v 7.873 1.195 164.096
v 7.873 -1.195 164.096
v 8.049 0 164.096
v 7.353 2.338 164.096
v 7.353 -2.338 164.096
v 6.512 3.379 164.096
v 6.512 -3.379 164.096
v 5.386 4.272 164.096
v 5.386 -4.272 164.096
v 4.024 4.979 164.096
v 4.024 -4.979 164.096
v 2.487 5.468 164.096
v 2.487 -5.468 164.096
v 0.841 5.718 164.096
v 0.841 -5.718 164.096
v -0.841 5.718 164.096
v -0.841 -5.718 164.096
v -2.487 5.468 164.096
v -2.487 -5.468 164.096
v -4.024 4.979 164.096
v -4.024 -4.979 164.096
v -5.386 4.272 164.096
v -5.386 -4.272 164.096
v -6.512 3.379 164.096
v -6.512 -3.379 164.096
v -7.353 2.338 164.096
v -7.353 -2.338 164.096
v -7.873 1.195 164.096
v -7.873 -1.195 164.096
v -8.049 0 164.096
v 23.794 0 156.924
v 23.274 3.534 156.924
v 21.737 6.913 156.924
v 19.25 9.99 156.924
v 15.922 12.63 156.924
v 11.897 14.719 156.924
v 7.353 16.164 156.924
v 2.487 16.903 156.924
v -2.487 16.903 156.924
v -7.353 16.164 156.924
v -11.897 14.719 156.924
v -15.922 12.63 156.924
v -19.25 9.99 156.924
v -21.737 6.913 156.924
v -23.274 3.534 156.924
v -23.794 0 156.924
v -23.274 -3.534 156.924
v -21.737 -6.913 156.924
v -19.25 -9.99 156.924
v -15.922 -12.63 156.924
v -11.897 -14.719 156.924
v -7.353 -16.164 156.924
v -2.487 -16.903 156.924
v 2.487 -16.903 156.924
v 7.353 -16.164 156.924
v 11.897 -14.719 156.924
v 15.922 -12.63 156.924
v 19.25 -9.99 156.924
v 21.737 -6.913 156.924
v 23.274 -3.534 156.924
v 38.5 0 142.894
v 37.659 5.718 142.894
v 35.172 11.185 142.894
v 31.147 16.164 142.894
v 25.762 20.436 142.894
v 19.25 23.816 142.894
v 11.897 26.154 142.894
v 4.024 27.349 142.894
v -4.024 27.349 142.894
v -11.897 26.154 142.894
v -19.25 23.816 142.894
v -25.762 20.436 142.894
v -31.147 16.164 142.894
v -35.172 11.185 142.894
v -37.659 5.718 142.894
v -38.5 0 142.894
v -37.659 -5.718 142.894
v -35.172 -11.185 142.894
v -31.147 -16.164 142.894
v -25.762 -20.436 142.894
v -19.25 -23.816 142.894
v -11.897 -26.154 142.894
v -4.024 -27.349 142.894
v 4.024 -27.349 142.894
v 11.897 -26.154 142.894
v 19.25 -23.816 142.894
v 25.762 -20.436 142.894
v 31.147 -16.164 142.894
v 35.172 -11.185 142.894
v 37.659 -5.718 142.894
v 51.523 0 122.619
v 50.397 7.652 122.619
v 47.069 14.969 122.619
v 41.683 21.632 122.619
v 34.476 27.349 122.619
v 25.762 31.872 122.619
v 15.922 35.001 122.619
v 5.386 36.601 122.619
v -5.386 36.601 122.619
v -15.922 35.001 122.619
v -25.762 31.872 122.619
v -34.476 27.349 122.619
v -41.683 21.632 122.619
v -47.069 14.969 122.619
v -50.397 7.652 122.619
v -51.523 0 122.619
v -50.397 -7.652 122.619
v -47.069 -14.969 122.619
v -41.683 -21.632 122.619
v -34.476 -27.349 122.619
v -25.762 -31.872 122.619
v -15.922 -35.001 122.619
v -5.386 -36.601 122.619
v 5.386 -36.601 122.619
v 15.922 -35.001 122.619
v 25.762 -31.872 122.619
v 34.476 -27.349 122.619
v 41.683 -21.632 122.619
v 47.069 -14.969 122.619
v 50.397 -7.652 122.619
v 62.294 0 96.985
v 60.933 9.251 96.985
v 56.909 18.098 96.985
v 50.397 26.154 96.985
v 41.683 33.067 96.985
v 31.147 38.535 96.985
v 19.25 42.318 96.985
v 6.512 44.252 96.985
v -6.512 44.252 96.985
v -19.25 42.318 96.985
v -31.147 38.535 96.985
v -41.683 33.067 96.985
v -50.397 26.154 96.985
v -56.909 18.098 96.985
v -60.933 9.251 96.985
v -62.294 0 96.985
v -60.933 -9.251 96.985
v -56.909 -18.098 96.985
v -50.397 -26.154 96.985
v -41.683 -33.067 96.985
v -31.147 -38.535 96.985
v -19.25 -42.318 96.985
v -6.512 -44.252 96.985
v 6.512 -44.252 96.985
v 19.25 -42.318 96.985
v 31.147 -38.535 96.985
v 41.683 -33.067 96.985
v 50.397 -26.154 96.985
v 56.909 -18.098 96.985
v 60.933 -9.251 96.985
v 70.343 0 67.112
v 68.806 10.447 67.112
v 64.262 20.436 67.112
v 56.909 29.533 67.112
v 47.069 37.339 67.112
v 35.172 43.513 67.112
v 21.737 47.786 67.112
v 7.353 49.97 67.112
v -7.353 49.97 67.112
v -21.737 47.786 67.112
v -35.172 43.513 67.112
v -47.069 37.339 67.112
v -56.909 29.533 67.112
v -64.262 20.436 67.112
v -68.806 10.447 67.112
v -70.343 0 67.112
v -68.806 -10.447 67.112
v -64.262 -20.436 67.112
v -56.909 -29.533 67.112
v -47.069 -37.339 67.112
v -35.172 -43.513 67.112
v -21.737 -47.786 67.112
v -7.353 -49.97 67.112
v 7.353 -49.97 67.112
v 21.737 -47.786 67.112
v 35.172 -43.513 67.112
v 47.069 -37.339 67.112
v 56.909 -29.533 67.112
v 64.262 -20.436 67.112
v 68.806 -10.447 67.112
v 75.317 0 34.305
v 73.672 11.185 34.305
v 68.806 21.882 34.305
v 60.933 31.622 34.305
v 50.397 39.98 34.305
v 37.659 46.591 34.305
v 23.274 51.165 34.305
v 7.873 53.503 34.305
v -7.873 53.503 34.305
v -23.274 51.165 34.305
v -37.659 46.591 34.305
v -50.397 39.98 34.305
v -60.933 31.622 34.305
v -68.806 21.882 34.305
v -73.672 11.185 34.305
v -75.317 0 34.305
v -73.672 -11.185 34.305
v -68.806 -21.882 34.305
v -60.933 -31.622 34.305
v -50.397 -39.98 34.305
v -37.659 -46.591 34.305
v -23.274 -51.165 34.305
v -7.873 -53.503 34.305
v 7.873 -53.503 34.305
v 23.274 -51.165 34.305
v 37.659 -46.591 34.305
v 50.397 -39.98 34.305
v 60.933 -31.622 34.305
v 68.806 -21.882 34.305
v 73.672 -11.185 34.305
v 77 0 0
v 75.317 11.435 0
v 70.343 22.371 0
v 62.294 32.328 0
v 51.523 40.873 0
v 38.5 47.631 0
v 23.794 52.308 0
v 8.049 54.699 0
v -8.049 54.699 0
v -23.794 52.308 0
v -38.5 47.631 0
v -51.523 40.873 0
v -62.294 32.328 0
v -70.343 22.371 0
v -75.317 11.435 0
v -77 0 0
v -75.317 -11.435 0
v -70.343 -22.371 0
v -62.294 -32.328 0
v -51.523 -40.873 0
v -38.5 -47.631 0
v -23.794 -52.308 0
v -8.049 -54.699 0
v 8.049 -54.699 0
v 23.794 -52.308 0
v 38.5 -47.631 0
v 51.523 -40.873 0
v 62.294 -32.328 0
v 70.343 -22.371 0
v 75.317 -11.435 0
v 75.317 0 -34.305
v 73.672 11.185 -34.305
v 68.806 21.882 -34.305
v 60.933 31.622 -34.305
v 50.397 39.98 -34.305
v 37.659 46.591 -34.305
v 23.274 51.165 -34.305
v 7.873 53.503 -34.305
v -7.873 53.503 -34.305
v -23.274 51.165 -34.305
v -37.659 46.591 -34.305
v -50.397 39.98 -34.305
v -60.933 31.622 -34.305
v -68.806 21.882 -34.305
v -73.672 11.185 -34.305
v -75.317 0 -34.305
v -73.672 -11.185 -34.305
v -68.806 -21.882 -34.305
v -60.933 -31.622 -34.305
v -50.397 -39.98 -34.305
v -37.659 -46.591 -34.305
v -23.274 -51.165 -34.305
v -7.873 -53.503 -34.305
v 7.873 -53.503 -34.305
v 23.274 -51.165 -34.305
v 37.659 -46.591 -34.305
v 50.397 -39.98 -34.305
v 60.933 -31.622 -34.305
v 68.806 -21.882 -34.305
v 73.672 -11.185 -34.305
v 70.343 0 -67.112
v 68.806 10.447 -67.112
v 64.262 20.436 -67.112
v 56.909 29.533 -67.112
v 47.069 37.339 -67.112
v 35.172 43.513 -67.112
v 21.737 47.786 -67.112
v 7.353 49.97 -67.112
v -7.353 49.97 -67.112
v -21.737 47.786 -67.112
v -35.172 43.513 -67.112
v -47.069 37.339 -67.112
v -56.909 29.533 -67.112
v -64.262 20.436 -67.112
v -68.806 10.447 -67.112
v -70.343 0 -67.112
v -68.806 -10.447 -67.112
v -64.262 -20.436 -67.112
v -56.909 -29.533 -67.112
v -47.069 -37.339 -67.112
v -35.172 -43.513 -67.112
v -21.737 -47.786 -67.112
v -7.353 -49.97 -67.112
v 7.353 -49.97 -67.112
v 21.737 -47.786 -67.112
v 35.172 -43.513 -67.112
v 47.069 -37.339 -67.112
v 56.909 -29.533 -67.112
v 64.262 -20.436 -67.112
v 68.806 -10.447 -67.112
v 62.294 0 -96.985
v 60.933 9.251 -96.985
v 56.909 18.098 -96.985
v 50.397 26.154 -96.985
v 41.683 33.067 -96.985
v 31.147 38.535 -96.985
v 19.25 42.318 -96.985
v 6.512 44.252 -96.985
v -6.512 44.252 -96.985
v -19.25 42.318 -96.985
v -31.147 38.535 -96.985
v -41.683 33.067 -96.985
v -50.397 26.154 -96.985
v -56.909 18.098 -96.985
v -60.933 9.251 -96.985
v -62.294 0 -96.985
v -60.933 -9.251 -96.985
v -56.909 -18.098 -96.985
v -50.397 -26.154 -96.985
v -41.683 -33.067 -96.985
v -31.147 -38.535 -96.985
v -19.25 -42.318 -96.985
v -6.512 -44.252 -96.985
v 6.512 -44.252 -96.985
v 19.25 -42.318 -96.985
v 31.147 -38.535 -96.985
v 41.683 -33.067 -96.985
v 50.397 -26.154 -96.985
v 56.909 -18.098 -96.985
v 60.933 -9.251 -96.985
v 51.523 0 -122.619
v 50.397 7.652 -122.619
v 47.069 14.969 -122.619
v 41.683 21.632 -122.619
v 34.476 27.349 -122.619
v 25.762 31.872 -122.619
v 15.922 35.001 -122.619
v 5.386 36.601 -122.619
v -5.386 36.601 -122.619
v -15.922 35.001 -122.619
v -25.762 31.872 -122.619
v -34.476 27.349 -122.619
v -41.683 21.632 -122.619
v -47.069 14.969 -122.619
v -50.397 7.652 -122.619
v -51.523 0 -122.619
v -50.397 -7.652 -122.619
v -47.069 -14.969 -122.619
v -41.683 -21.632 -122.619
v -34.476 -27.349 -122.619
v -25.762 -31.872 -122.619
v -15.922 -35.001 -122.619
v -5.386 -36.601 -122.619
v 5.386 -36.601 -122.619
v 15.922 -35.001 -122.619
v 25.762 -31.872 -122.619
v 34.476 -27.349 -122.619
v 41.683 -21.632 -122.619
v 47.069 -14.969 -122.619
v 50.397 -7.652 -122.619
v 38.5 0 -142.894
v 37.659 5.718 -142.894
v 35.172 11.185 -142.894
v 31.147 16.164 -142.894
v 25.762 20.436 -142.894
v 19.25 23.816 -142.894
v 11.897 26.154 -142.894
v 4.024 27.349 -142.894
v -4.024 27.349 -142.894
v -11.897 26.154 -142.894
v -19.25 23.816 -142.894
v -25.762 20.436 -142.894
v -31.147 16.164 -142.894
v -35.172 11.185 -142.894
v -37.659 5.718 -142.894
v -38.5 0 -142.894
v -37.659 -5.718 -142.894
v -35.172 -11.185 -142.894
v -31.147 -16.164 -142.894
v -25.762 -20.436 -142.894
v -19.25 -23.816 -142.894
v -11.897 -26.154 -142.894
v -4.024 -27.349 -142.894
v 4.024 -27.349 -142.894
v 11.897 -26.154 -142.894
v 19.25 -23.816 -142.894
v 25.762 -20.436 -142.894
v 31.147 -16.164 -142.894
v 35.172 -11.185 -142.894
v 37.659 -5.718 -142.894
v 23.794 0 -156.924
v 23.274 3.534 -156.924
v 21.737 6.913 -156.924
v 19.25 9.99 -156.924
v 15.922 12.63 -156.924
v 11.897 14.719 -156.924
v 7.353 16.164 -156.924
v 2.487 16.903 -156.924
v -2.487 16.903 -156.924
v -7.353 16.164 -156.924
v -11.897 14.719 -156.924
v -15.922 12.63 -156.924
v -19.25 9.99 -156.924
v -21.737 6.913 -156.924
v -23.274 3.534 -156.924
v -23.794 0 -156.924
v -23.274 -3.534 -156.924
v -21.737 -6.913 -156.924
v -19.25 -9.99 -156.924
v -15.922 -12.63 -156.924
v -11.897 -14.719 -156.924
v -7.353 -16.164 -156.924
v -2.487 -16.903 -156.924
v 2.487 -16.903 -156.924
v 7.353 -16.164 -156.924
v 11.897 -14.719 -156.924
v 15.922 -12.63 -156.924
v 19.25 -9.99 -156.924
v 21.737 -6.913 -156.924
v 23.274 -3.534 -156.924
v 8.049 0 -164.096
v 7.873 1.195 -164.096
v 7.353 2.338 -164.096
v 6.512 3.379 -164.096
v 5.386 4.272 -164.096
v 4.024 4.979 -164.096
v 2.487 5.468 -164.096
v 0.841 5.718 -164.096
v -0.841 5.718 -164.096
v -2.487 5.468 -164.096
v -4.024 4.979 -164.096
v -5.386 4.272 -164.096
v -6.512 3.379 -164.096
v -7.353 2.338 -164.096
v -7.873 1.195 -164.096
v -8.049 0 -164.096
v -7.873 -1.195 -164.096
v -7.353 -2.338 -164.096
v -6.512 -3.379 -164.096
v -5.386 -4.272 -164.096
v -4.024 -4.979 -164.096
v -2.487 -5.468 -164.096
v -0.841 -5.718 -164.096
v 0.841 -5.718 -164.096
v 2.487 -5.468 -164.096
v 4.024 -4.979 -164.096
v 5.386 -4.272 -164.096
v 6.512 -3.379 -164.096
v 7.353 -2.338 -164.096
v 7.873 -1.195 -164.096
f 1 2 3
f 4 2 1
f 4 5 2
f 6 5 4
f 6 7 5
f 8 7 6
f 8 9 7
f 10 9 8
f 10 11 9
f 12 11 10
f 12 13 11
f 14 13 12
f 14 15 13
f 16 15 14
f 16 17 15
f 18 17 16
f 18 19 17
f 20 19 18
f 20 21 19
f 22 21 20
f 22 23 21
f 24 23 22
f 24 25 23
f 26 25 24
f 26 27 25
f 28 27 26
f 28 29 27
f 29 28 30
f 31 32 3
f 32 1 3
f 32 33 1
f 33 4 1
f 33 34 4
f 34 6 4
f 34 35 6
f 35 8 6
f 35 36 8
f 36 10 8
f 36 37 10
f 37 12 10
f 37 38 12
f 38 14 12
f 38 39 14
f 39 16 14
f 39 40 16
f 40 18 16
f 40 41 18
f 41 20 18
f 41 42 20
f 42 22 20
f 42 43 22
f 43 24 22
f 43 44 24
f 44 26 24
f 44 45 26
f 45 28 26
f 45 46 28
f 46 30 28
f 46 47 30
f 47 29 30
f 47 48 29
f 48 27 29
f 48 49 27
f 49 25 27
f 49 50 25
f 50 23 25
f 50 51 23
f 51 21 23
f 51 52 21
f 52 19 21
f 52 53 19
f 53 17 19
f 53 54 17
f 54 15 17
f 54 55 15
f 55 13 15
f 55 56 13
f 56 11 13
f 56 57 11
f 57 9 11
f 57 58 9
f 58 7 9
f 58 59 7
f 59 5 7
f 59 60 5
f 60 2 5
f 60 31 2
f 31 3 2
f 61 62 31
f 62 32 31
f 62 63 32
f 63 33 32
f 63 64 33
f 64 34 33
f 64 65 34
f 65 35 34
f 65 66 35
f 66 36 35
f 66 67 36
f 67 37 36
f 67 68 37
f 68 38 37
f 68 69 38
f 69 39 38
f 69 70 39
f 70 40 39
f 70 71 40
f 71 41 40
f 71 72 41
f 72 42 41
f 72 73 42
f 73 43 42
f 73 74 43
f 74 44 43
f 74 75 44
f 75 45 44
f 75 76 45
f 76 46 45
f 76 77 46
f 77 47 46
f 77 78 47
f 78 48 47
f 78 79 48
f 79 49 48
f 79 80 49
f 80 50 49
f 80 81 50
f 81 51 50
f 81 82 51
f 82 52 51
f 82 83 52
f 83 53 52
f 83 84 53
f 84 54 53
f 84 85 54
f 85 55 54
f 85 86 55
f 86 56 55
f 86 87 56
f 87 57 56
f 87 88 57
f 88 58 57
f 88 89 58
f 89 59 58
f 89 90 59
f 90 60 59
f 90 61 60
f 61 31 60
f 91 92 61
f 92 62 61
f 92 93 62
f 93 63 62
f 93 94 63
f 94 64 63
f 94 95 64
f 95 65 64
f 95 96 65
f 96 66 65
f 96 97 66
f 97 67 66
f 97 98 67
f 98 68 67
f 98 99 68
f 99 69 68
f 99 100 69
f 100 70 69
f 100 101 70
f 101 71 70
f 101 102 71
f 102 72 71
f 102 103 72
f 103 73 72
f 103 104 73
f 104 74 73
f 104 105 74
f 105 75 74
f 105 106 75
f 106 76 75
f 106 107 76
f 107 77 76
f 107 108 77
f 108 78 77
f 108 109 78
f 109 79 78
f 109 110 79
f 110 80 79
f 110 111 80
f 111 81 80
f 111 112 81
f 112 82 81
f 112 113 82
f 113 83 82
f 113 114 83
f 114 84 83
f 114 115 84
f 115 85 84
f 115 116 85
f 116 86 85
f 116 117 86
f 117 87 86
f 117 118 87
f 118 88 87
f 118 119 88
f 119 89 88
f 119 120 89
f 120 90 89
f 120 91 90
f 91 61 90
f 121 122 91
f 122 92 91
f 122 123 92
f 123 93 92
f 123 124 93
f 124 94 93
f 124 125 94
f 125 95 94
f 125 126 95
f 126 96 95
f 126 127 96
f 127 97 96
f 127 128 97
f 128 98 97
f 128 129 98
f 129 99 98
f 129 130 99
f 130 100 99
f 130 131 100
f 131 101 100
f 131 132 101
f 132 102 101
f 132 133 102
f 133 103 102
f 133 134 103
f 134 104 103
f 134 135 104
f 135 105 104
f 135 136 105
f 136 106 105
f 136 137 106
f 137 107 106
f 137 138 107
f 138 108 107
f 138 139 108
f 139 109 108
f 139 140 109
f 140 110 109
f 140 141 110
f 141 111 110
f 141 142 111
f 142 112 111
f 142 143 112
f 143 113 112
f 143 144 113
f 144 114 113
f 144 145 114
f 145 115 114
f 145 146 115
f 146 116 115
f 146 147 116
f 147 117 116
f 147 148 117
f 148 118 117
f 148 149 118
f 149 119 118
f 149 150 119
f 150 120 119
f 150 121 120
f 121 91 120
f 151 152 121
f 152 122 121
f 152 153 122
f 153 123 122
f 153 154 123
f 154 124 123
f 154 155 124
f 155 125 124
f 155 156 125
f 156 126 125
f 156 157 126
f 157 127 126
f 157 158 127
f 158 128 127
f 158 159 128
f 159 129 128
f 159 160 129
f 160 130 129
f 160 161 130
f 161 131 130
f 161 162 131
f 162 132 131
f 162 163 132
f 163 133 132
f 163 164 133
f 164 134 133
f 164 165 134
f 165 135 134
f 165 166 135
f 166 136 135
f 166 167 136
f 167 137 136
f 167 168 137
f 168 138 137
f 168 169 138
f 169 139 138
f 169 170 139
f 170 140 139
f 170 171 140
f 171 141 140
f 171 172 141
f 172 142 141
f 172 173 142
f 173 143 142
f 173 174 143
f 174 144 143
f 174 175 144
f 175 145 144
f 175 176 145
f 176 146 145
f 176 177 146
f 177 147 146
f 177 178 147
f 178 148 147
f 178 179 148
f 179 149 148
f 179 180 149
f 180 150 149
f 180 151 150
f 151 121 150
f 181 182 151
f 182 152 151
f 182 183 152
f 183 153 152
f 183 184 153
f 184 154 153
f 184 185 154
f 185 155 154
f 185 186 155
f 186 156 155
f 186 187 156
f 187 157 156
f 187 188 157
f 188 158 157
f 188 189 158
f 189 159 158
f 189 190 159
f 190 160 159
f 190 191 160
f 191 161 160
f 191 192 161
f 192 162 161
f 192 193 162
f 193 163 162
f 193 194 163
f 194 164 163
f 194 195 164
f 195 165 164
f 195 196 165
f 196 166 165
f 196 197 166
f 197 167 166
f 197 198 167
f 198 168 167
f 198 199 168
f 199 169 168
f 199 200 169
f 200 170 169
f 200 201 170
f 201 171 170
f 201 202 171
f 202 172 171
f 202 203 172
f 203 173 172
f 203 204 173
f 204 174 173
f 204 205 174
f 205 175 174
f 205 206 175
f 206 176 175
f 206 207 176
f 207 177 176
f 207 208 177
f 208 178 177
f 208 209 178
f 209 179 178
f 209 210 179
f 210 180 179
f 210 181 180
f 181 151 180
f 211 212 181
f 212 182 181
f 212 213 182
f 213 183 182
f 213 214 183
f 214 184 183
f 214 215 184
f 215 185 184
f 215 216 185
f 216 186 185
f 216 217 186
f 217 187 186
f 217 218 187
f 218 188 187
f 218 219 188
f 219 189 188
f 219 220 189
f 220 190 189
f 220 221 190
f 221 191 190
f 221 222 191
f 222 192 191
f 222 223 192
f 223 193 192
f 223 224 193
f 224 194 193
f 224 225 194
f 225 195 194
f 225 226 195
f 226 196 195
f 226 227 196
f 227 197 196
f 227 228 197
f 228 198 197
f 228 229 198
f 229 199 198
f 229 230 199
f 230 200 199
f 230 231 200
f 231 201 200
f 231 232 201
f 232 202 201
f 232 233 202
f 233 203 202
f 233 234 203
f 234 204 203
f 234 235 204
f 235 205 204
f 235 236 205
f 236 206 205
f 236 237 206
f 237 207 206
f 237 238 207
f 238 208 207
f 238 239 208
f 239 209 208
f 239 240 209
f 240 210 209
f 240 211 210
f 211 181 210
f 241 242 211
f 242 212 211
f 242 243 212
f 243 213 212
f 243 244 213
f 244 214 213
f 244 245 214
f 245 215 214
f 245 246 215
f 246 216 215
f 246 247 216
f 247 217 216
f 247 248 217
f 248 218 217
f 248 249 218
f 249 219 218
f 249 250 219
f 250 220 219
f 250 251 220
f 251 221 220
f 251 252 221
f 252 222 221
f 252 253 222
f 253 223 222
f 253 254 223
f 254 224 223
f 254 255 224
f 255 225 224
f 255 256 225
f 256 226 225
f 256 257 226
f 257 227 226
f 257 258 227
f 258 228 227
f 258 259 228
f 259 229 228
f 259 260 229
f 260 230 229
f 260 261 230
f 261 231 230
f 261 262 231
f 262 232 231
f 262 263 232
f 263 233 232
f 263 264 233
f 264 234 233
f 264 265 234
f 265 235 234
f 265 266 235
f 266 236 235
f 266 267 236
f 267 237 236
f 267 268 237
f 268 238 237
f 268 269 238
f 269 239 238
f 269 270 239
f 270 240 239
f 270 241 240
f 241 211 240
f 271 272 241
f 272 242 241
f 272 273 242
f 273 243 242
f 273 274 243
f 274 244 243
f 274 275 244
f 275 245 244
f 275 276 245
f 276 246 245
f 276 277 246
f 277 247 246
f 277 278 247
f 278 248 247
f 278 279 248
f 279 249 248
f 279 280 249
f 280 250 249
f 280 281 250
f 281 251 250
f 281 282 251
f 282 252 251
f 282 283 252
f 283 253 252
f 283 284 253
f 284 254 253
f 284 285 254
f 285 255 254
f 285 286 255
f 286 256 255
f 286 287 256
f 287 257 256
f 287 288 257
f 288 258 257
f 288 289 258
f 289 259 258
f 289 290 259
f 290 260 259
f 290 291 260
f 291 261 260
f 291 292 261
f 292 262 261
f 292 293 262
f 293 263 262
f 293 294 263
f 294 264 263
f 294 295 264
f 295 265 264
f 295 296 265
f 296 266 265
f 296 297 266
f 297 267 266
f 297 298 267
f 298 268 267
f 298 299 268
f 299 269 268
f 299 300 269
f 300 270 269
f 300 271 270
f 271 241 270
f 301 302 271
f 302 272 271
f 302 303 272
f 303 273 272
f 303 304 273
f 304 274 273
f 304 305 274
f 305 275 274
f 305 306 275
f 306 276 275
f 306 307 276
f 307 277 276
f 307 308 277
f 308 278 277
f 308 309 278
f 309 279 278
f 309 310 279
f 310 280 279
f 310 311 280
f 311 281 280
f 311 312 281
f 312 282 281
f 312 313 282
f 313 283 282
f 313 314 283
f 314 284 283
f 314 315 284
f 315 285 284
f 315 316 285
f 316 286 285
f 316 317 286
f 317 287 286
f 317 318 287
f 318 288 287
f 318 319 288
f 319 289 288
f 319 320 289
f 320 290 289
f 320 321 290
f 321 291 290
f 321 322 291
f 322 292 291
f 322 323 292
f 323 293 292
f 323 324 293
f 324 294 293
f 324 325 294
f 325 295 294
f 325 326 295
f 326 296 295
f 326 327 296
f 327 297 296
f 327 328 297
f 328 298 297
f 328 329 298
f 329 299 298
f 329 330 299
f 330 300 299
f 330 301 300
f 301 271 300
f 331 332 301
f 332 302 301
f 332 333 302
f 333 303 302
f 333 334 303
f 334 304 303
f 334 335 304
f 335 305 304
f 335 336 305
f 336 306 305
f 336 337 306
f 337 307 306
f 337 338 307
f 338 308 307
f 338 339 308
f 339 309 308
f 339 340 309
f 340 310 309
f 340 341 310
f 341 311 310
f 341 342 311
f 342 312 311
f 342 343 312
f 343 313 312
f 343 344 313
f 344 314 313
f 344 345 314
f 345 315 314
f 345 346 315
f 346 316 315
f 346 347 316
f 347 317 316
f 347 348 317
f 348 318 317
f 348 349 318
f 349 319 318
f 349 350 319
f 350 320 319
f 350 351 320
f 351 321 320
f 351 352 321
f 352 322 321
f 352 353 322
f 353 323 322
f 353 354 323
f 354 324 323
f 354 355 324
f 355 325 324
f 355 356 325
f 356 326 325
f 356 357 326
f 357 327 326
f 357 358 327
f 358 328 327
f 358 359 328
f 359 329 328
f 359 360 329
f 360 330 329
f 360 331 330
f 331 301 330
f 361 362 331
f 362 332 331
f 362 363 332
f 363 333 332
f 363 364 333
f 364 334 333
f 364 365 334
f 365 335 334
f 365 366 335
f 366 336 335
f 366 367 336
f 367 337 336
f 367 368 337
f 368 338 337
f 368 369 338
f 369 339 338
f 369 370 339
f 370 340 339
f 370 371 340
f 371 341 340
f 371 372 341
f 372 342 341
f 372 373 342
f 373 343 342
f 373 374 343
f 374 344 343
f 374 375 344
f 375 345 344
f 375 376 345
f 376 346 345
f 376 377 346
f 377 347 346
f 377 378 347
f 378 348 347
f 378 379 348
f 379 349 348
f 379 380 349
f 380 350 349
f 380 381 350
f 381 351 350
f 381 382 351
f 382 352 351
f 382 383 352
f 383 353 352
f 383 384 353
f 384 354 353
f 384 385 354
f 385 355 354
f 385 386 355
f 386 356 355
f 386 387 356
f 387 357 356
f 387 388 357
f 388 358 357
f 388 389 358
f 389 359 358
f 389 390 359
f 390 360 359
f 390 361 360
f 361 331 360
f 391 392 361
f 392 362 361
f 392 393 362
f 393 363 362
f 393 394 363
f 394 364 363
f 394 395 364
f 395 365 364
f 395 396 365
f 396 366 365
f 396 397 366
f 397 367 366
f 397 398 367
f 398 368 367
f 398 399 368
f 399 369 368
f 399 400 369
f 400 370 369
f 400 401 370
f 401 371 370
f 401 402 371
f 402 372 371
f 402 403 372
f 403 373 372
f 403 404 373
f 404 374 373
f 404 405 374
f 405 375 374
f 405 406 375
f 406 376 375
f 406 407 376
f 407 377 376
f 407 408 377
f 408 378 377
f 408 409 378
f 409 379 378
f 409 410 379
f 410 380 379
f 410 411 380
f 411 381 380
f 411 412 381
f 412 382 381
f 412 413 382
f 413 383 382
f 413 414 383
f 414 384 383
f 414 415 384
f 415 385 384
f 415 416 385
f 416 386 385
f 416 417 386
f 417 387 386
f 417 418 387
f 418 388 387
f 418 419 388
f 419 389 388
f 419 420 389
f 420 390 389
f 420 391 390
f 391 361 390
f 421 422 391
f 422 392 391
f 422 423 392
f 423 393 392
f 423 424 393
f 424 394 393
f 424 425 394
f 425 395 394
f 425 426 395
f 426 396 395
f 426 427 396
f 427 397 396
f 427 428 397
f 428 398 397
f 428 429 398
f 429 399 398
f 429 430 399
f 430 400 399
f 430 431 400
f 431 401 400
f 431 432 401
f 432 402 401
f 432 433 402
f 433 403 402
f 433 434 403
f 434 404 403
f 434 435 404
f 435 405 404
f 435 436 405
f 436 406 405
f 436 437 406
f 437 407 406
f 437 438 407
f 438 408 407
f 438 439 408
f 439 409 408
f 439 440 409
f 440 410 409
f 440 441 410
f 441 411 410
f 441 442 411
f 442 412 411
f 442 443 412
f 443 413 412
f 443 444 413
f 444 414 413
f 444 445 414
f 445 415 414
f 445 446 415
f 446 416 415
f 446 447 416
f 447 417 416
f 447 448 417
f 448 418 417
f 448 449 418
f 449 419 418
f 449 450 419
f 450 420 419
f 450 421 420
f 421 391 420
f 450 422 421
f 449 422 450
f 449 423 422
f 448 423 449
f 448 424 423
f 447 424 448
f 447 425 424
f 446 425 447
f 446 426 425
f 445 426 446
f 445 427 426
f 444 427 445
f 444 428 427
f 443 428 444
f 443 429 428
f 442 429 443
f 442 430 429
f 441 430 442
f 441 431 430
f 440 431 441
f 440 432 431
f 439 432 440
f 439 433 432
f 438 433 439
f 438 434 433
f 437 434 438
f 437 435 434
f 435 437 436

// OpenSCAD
// Generated by SolidPython 1.0.1 on 2020-07-29 00:46:47


scale(v = [7, 5, 15]) {
	sphere(r = 11);
}
/***********************************************
*********      SolidPython code:      **********
************************************************
 
# import packages: SolidPython
from solid import *
from solid.utils import *
from itertools import chain, combinations, permutations


class Resize:

    def __init__(self, scad_file):
        self.scad_file = scad_file
        #self.scad_file = import_scad(scad_file)
        # cone/cylinder param:
        self.r1 = 0
        self.r2 = 0
        self.h = 0
        # rectangular prism param:
        self.w = 0
        self.l = 0
        # ellipse param:
        self.r = 0

    # import OpenScad code (file name corresponds to shape)


    # classify shape + parameters
    def assign(self, param1, param2, param3):
        if self.scad_file == 'cone.scad':
            self.r1 = param1
            self.r2 = param2
            self.h = param3
        elif self.scad_file == 'cylinder.scad':
            self.r1 = param1
            self.r2 = param2
            self.h = param3
        elif self.scad_file == 'rectangularPrism.scad':
            self.h = param1
            self.l = param2
            self.w = param3
        else:
            self.r = param1
            self.h = param2

    # resize parameters
    def iterate(self):
        x = range(3, 20, 2)
        i = 1
        if self.scad_file == 'cone.scad':
            tempList = list(permutations(x, 2))
            for temp in tempList:
                param1 = temp[0]
                param2 = temp[1]
                filepath = 'produced_scad_files/' + 'cone' + str(param1) + '_' + str(param2) + '_' + '.scad'
                scad_render_to_file(cylinder(h=param1, r1=param2, r2=0), filepath)

        elif self.scad_file == 'cylinder.scad':
            tempList = list(permutations(x, 3))
            for temp in tempList:
                param1 = temp[0]
                param2 = temp[1]
                filepath = 'produced_scad_files/' + 'cylinder' + str(param1) + '_' + str(param2) + '_' + '.scad'
                scad_render_to_file(cylinder(h=param1, r1=param2, r2=param2), filepath)

        elif self.scad_file == 'rectangularPrism.scad':
            tempList = list(permutations(x, 3))
            for temp in tempList:
                param1 = temp[0]
                param2 = temp[1]
                param3 = temp[2]
                filepath = 'produced_scad_files/' + 'rectangularPrism' + str(param1) + '_' + str(param2) + '_' + str(
                    param3) + '.scad'
                scad_render_to_file(cube(size=(param1, param2, param3)), filepath)

        elif self.scad_file == 'ellipse.scad':
            tempList = list(permutations(x, 4))
            for temp in tempList:
                param1 = temp[0]
                param2 = temp[1]
                param3 = temp[2]
                param4 = temp[3]
                filepath = 'produced_scad_files/' + 'ellipse' + str(param1) + '_' + str(param2) + '_' + str(param3) + '_' + str(param4) + '.scad'
                scad_render_to_file(scale([param1, param2, param3])(sphere(r=param4)), filepath)

    def render_to_scadfile(self):
        scad_render_to_file(scad, 'example.scad') 
 
************************************************/
